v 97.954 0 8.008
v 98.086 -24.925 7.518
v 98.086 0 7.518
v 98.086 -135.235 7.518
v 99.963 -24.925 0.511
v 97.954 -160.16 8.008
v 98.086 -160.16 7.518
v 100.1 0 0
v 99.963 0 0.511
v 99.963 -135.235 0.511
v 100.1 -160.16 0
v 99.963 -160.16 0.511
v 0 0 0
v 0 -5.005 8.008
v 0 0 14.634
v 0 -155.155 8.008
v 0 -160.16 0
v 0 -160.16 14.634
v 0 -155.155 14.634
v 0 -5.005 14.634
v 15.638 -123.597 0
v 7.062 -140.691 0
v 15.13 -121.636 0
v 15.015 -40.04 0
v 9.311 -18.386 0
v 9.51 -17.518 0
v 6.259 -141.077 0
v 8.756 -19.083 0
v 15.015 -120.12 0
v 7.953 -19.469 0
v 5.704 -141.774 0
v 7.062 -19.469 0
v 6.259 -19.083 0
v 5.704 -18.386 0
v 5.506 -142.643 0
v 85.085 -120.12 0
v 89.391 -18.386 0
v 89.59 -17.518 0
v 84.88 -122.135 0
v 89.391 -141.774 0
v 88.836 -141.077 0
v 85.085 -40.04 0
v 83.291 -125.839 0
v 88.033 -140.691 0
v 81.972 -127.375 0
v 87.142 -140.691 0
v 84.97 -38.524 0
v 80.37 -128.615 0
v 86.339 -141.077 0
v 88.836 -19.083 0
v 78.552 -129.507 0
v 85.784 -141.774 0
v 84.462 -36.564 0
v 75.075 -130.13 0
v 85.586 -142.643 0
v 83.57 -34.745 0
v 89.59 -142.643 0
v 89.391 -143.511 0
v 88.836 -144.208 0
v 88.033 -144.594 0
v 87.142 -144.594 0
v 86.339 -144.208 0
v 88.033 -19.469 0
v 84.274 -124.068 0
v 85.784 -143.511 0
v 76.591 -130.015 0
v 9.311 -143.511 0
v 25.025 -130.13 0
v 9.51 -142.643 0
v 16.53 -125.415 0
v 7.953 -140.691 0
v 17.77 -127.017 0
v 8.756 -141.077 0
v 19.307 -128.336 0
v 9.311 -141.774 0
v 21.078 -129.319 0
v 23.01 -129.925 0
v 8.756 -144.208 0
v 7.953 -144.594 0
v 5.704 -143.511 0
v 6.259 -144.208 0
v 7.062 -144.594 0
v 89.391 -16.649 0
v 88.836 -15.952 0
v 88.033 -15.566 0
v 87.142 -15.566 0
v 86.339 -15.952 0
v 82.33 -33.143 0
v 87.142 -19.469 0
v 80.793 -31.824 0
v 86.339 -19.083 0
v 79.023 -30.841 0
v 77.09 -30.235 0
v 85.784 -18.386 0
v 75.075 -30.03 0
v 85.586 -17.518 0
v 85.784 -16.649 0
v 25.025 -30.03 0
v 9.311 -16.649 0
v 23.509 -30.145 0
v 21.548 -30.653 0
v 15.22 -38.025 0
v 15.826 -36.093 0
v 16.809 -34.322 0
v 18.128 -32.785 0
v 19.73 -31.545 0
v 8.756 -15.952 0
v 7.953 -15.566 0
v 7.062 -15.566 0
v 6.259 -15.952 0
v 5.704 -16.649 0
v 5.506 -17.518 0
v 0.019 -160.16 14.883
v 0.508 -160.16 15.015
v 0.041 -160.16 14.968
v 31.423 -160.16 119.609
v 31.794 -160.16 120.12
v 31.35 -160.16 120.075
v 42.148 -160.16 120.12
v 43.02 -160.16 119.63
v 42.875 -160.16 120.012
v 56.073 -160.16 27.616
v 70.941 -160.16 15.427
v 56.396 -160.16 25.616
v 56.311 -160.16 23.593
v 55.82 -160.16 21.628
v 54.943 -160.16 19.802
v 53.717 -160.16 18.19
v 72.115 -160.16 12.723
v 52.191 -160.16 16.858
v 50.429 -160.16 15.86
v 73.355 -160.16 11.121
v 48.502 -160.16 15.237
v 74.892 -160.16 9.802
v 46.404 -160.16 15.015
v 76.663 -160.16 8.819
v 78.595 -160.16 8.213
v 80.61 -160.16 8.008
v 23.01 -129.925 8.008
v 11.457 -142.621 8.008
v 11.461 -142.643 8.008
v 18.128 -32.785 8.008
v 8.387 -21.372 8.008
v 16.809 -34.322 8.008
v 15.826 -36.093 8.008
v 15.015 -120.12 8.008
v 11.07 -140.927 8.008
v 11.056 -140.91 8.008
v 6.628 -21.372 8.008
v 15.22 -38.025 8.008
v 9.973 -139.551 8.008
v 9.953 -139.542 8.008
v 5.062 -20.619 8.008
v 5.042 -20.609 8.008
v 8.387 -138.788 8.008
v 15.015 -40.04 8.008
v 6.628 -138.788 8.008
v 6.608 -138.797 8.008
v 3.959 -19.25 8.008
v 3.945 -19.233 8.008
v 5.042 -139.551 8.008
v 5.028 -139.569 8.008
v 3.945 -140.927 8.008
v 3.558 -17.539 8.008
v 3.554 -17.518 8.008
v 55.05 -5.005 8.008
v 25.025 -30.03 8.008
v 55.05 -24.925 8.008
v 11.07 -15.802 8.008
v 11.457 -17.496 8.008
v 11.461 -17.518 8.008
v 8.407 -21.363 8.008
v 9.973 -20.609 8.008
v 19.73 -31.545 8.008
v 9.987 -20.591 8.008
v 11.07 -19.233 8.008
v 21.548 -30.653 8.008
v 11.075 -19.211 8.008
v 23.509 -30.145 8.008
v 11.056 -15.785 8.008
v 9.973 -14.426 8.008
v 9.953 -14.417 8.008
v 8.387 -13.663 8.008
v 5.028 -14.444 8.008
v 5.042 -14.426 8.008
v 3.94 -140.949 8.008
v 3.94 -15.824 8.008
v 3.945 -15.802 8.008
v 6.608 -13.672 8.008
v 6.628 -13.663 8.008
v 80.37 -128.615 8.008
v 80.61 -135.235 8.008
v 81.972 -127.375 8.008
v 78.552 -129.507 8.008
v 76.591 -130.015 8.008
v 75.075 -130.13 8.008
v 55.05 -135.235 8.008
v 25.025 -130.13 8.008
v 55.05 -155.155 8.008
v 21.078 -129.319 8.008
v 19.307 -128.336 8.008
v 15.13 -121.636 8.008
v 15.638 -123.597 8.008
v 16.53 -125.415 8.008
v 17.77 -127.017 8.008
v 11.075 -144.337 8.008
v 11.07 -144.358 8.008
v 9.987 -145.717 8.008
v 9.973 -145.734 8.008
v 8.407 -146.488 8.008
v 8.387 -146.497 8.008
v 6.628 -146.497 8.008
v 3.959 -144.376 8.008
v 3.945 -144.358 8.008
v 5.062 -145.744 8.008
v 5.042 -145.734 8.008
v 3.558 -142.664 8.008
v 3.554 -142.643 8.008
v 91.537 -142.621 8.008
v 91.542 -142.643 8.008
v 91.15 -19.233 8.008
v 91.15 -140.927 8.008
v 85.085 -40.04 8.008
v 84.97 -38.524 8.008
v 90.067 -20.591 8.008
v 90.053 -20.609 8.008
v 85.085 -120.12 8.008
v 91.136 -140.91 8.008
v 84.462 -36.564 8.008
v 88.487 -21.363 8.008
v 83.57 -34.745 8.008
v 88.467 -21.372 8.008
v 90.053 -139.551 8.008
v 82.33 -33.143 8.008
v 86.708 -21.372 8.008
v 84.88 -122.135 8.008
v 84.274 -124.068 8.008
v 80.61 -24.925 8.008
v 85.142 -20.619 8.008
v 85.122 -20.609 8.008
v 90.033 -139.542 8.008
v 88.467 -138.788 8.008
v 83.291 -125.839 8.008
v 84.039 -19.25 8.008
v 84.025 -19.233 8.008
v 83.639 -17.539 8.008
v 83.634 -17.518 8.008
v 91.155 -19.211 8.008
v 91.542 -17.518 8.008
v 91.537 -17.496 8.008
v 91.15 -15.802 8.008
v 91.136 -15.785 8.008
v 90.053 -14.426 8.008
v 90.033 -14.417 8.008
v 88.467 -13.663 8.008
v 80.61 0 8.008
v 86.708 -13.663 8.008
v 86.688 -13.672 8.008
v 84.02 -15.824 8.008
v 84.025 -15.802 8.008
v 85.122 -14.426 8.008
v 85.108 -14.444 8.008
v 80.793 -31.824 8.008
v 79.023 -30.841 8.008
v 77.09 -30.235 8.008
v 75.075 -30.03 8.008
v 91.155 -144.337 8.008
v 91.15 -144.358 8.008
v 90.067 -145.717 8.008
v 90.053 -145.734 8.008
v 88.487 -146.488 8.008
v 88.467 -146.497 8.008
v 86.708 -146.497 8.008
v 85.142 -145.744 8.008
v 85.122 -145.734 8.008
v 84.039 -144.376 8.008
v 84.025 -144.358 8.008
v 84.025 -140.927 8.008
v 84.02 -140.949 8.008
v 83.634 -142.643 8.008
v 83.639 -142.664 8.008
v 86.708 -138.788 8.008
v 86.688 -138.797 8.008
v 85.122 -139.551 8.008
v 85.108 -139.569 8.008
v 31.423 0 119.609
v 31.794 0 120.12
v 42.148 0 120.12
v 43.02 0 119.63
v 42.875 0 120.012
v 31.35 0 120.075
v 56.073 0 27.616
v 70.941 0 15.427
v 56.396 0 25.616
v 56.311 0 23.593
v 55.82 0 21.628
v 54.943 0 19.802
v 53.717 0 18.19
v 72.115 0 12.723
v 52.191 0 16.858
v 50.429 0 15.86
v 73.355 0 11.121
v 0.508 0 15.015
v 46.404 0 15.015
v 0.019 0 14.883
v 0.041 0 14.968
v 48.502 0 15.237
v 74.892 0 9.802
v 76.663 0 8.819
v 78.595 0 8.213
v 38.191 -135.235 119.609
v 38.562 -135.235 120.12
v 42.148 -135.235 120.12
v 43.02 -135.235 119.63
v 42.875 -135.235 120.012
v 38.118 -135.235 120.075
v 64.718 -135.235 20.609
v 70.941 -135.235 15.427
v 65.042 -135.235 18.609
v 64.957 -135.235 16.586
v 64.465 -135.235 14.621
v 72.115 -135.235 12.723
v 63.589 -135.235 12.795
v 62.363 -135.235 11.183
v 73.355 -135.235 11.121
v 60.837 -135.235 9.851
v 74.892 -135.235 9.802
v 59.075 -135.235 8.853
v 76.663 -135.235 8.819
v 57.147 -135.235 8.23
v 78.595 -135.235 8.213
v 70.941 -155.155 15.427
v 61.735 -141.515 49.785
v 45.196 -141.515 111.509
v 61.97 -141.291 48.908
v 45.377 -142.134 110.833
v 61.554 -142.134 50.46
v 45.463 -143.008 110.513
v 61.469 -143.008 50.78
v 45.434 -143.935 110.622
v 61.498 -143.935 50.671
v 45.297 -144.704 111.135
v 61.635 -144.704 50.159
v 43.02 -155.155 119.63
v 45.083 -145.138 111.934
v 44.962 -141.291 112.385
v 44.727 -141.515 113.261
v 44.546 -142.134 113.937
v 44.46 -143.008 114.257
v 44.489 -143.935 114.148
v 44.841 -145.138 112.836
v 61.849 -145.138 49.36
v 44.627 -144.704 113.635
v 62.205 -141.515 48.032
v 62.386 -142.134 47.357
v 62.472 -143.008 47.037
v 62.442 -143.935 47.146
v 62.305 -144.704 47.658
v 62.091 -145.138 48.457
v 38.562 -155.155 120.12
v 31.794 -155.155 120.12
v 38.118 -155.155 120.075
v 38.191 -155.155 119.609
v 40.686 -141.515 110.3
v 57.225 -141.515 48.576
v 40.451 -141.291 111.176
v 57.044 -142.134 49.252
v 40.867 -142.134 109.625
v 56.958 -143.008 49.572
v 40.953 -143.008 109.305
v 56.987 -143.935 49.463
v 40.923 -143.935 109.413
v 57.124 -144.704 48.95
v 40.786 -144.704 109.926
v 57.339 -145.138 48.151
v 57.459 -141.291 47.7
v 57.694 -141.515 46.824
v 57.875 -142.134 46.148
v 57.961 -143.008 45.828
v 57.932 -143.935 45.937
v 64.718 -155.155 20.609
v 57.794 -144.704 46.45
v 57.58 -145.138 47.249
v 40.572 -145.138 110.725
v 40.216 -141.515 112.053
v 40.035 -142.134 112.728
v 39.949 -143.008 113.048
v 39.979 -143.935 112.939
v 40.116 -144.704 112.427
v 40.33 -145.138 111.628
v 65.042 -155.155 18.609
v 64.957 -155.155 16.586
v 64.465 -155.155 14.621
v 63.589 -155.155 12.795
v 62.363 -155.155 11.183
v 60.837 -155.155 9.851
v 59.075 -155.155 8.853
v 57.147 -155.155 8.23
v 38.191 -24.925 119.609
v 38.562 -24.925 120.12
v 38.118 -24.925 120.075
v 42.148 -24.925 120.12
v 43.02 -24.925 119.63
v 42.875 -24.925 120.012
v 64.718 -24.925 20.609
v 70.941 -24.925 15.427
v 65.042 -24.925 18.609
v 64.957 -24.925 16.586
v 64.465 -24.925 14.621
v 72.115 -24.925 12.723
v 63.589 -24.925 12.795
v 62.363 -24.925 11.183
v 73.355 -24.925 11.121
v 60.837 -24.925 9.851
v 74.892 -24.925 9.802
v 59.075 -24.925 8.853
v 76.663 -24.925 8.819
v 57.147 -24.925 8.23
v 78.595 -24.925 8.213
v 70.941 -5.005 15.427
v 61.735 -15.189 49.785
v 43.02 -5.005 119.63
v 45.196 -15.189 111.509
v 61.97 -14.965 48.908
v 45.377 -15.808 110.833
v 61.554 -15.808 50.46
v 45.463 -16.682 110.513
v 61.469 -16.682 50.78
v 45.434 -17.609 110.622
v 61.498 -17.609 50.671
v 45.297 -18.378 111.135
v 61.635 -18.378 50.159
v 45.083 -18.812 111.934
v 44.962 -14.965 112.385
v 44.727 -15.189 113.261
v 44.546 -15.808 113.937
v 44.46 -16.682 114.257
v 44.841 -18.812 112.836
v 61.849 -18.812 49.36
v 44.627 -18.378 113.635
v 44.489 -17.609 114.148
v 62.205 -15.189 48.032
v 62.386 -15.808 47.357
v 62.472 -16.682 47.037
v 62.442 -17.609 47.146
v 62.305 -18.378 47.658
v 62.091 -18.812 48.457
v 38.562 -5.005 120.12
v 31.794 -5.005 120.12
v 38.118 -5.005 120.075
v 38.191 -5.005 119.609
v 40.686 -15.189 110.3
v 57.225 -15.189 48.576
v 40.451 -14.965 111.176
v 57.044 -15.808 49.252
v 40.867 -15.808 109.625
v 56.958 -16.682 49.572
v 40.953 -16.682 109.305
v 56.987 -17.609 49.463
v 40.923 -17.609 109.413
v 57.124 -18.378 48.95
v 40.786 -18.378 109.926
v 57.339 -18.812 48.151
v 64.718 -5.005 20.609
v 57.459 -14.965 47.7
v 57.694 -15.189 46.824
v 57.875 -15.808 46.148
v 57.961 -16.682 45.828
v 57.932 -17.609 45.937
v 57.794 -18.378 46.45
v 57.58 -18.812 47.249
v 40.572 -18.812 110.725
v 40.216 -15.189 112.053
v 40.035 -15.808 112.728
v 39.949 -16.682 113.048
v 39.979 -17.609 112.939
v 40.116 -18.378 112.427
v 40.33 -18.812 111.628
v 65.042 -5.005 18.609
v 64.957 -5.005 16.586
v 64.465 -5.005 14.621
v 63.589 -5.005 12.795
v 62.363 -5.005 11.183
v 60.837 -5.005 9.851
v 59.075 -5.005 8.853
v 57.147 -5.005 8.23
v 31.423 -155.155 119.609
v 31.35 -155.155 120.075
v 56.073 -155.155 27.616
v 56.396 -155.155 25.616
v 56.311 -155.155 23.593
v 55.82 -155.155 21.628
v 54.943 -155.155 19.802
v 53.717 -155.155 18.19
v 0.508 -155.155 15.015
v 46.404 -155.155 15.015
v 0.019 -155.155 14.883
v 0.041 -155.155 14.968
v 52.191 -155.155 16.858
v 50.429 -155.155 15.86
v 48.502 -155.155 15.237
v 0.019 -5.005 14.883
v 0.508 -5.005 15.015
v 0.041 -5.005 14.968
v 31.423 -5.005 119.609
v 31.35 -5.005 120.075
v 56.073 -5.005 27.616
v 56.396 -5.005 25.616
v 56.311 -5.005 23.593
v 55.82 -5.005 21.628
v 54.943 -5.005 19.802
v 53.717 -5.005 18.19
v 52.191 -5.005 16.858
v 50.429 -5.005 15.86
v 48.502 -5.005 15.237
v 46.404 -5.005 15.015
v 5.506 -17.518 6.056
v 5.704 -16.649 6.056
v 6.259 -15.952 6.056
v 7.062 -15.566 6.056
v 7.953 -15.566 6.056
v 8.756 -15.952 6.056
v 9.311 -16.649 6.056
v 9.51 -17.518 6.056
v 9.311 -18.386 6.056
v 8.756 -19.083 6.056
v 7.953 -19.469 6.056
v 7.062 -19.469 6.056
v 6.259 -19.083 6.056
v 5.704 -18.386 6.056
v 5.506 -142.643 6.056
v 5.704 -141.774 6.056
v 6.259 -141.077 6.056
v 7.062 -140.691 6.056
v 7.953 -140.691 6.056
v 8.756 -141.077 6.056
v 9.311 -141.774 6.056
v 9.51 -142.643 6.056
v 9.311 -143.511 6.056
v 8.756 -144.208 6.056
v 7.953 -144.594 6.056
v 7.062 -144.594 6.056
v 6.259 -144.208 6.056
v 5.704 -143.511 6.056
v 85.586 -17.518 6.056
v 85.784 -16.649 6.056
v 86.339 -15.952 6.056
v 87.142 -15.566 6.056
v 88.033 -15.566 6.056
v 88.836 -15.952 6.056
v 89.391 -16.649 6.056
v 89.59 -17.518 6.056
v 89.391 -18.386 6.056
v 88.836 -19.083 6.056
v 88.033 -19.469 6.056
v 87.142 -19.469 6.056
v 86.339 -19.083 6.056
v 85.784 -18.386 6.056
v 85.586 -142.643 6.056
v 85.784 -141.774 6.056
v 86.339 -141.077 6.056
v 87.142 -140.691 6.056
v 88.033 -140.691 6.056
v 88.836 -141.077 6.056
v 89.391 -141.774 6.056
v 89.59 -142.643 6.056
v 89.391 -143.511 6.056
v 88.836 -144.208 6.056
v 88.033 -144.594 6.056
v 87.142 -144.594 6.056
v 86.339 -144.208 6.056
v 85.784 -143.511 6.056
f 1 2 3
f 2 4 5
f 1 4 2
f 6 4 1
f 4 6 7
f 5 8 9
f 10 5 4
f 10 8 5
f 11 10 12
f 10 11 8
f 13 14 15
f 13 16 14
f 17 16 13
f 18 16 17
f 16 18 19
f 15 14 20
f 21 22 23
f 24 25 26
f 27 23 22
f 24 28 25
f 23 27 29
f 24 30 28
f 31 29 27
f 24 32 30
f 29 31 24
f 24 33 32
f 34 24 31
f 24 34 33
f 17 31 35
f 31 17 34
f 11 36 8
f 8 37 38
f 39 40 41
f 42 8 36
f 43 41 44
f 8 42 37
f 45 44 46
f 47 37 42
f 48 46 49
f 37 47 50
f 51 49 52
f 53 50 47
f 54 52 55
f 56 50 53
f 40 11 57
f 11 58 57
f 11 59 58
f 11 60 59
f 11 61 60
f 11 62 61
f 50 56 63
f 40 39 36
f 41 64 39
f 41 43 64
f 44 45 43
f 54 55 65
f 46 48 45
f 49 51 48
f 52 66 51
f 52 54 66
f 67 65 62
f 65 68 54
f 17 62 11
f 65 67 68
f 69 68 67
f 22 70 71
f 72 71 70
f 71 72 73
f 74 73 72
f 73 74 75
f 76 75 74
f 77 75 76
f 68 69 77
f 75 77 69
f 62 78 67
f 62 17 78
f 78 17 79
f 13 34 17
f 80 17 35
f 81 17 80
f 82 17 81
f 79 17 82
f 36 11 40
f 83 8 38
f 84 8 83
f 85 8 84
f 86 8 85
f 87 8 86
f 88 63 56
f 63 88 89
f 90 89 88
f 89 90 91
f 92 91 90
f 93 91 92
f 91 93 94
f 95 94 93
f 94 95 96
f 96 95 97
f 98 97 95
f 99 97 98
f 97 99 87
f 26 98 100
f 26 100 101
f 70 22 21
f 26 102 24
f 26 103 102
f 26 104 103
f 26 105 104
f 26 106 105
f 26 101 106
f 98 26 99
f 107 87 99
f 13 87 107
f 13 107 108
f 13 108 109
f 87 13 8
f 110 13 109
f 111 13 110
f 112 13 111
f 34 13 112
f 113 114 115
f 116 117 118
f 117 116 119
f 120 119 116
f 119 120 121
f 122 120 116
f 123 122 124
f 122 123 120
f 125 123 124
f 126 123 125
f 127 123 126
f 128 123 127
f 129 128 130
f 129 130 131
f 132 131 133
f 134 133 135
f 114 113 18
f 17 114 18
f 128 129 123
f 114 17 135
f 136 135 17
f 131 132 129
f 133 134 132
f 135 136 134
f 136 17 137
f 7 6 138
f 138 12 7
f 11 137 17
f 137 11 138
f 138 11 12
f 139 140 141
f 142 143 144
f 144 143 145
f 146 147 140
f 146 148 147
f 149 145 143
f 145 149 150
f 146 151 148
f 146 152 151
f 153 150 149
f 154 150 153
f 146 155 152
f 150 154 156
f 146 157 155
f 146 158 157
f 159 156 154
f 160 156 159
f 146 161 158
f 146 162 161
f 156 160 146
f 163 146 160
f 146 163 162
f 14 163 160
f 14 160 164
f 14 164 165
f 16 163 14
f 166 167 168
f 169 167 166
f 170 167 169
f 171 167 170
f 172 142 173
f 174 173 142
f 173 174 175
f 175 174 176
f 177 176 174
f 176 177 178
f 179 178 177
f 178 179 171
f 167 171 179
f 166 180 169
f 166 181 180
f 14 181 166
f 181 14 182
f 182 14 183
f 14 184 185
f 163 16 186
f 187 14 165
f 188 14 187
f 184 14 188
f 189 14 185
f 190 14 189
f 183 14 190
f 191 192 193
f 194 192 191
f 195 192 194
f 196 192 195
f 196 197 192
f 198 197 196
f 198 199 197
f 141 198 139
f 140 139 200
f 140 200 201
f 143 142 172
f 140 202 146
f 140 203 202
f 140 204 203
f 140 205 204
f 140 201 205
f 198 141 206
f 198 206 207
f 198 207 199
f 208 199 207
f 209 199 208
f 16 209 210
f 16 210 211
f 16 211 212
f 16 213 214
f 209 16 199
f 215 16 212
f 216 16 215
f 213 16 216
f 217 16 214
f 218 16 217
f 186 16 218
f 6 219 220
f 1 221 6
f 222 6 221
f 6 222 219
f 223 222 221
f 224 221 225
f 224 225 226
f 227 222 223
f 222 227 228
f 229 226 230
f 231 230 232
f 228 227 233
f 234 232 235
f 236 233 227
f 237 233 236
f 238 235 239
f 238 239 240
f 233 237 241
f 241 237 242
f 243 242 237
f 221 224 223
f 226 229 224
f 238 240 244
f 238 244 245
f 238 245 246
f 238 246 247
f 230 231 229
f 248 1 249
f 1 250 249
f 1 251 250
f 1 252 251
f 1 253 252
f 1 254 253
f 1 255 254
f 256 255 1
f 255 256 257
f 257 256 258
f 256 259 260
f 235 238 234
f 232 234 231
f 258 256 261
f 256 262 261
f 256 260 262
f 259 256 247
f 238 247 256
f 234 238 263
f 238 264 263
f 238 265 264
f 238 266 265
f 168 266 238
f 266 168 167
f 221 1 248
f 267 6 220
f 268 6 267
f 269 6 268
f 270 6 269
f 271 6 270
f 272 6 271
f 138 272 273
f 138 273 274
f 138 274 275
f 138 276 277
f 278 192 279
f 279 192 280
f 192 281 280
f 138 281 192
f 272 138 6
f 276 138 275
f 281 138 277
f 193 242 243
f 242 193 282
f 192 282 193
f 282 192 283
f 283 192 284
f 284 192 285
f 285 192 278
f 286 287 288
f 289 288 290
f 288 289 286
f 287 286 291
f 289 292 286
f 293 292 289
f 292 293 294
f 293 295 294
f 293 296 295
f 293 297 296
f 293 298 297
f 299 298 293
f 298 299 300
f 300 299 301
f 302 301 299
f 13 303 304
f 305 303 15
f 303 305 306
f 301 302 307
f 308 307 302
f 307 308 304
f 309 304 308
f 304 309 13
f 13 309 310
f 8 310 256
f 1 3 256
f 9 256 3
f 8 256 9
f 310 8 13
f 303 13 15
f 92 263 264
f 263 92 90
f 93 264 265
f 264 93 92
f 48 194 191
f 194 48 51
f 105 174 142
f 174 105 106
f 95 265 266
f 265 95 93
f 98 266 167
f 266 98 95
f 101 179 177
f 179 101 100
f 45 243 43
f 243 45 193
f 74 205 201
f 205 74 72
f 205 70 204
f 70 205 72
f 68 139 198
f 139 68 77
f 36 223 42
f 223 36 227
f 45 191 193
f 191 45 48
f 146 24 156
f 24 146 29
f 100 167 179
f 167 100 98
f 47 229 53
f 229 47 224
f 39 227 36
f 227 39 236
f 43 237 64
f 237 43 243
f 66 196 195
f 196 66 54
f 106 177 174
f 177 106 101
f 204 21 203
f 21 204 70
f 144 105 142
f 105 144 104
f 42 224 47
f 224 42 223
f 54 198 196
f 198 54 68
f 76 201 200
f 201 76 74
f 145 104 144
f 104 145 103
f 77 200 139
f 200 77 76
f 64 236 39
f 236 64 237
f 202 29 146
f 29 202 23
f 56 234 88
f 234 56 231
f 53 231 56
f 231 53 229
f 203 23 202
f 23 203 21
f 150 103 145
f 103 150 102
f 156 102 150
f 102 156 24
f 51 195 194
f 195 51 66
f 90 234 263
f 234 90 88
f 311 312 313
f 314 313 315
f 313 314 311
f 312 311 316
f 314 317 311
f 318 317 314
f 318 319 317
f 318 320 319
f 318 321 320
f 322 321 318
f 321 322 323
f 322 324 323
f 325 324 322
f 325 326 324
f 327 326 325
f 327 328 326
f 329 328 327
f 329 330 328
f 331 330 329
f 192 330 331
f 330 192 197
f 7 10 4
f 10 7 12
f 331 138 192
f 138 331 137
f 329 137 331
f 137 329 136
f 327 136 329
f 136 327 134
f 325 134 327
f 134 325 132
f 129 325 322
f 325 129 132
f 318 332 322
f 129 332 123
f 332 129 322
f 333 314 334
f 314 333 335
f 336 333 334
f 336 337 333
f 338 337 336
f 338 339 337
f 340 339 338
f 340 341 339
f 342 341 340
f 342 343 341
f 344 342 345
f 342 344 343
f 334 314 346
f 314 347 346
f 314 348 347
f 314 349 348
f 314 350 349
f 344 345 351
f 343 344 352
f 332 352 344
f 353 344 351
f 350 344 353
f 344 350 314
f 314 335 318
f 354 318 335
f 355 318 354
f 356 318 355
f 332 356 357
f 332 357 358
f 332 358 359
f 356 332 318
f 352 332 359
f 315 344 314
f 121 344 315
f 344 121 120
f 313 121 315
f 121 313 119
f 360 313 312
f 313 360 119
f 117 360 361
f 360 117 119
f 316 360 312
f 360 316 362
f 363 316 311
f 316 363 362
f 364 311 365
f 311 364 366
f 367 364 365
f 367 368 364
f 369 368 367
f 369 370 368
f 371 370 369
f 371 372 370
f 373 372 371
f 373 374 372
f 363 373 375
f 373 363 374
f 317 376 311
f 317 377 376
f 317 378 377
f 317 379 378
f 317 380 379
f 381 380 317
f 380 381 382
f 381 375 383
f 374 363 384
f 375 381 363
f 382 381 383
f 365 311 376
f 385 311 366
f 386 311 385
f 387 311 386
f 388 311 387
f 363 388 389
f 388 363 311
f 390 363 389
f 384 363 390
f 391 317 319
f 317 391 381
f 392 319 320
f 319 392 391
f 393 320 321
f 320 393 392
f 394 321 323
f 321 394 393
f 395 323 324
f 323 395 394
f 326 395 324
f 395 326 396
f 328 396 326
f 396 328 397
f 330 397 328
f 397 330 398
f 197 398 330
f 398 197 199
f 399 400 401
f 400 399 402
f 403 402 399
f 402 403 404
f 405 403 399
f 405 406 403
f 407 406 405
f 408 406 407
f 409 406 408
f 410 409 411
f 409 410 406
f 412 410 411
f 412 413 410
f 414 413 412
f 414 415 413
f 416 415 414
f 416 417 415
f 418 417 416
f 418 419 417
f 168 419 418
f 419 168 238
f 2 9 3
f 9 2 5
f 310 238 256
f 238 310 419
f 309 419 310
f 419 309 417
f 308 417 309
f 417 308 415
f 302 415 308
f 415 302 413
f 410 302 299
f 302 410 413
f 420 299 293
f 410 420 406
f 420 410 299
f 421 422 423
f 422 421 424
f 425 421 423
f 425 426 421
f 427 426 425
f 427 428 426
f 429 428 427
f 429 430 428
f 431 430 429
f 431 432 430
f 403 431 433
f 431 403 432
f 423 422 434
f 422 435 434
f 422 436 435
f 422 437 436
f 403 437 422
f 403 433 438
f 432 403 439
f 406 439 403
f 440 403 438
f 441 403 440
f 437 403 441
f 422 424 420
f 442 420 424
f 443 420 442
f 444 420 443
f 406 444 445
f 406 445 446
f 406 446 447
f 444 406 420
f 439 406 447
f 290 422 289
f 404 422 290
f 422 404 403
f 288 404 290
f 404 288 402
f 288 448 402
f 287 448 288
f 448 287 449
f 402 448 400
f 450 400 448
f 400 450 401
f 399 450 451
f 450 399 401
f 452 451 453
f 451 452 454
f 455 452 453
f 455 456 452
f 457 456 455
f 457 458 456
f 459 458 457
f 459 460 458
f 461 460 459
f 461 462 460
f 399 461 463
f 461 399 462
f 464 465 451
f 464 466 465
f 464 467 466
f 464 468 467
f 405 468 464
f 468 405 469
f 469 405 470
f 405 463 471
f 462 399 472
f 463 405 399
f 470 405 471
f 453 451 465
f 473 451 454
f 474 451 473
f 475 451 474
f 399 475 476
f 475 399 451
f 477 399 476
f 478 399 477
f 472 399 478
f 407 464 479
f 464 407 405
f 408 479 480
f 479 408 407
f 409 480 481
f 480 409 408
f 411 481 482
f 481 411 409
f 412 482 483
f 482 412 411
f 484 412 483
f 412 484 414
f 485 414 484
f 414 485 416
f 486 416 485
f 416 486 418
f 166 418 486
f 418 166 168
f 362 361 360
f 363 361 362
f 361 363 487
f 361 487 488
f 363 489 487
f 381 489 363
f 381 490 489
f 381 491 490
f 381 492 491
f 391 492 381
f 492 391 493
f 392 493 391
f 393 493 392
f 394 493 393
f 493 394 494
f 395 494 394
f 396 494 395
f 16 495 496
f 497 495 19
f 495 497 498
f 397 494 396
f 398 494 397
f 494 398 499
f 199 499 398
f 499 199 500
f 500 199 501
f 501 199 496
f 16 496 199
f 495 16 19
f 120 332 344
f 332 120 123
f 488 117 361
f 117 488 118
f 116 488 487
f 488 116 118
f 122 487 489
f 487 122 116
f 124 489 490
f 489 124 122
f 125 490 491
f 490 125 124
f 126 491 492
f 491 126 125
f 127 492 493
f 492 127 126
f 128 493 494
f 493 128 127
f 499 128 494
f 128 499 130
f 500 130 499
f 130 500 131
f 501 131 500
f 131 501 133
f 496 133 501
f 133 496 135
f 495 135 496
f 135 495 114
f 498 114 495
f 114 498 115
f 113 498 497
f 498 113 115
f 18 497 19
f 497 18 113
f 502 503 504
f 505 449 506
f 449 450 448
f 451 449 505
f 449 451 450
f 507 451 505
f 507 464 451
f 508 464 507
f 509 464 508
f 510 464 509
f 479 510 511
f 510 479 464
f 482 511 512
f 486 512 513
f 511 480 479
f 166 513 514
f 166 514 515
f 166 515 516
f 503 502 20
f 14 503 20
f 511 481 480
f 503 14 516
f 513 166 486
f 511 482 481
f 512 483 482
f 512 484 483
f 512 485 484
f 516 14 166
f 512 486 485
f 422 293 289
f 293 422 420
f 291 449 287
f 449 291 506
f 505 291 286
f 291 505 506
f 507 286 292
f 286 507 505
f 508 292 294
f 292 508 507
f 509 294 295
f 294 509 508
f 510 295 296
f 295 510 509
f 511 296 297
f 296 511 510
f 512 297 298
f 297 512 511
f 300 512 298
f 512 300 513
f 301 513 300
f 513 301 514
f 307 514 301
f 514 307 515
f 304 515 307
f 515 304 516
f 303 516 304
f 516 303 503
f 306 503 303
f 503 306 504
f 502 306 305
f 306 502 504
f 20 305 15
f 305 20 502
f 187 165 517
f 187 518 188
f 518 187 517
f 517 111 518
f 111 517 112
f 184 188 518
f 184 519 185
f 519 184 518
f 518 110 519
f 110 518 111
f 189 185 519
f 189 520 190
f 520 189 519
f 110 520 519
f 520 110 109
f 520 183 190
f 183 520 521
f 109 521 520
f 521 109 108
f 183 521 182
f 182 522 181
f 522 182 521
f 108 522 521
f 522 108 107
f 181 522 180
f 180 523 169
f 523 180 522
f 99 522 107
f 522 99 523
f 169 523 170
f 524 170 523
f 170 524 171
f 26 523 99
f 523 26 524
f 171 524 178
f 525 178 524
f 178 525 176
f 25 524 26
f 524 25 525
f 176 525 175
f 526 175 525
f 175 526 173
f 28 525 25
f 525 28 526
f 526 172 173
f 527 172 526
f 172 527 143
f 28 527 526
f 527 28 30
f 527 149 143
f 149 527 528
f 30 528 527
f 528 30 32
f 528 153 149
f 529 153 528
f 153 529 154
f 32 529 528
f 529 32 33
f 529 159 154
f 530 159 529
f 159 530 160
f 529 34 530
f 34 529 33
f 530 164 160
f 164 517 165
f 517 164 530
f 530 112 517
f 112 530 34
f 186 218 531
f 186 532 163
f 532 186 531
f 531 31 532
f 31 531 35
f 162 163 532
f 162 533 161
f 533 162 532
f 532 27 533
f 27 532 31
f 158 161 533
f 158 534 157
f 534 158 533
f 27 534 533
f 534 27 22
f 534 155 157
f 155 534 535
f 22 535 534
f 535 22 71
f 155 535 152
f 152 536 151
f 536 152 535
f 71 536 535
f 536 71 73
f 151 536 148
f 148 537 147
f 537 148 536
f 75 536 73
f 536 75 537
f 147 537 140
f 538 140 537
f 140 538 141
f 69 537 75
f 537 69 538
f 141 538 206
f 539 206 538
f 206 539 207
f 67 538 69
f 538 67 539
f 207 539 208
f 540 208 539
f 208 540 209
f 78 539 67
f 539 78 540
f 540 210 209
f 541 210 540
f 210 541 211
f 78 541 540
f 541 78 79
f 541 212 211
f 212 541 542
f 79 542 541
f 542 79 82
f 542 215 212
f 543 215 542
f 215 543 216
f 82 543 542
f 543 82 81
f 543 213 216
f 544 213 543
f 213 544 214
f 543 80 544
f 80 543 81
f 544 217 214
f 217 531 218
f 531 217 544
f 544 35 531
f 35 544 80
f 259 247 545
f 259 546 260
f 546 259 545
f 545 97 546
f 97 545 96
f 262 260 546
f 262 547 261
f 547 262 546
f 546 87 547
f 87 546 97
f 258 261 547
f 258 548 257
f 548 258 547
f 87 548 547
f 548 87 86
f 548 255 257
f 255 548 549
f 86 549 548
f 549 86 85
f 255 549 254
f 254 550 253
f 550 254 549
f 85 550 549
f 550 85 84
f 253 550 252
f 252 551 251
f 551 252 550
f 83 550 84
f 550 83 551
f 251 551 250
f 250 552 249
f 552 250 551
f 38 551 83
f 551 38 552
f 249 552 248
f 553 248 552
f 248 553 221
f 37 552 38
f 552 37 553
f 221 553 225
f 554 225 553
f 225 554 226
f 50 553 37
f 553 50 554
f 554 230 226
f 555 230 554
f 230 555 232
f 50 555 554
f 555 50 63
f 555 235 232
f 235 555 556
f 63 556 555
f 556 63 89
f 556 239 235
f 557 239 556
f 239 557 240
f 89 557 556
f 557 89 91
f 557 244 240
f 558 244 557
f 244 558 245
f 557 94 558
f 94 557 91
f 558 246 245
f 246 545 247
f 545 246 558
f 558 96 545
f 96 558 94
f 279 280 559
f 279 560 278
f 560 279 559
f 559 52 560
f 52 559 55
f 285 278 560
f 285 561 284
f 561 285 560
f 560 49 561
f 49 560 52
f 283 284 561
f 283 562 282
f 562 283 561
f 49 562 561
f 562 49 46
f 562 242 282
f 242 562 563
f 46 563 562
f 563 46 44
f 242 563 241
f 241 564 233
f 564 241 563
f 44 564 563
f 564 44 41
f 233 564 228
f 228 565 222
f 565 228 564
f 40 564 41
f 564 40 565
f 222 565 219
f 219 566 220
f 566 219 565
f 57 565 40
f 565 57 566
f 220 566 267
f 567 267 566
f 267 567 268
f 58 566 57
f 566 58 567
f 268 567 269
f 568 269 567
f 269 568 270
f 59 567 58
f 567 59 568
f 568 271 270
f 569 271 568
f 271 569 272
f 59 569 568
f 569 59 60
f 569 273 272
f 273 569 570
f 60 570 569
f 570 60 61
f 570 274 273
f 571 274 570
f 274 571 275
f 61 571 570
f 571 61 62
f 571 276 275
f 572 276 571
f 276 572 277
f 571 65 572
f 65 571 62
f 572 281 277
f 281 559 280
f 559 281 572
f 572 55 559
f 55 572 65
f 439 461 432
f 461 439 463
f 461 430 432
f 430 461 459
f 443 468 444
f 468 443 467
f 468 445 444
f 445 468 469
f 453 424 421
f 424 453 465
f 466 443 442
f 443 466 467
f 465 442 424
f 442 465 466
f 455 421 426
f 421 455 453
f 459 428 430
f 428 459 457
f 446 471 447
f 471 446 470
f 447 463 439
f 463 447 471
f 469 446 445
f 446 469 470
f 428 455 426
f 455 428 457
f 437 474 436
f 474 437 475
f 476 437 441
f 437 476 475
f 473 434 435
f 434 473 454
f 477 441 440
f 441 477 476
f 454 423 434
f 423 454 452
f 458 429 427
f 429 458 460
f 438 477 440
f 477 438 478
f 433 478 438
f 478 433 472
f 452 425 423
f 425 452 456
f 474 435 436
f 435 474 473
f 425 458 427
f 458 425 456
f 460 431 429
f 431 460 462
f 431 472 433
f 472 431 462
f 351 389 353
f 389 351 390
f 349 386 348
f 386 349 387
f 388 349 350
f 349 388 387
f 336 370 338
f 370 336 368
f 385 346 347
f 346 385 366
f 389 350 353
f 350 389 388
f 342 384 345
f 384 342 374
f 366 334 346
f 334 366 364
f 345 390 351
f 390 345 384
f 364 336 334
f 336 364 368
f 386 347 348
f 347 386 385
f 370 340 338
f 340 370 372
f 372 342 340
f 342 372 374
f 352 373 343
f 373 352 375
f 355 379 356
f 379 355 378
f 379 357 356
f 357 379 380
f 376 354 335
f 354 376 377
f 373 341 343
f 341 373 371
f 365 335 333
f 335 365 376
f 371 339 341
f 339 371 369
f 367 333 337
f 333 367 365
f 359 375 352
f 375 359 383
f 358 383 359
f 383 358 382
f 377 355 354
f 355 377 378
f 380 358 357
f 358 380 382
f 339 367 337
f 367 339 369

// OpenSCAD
//------------------------------------------------------------------
/*

Simple Display Stand for Rasberry Pi 7" Display

Similar to: http://www.thingiverse.com/thing:1021025

But:

1) OpenSCAD.
2) Allow the usb power port to be at the bottom (normal display orientation).
3) Provide mounting holes on the foot.
4) Variable thickness display supports to accomodate various M3 screw lengths.
5) Added webbing for better strength.
6) Adjustable foot size for better free-standing stability.

*/
//------------------------------------------------------------------
/* [Global] */

/*[General]*/
display_angle = 15;

/*[Base]*/
base_height = 8;
base_length = 160;
base_width = 100;
base_mount_hole_diameter = 4;
base_hole_rounding = 10;
base_mount_hole_posn = 0.8; // [0:0.05:1]
foot_sizex = 15;
foot_sizey = 30;

/*[Supports]*/
support_posn = 0.75; // [0:0.05:1]
support_height = 120;
support_thickness = 5;
support_hole2edge = 8;

/*[Webs]*/
web_thickness = 7;
web_radius = 10;

/* [Hidden] */
//------------------------------------------------------------------
// utility functions

// scaling
pla_shrink = 1/0.999; //~0.1%
abs_shrink = 1/0.995; //~0.5%
function scale(x) = pla_shrink * x;

// small tweak to avoid differencing artifacts
epsilon = 0.05;

// control the number of facets on cylinders
facet_epsilon = 0.05;
function facets(r) = 180 / acos(1 - (facet_epsilon / r));

// rounded/filleted edges
module inverse() {
  difference() {
    square(1e5, center=true);
    children(0);
  }
}
module rounded(r=1) {
  offset(r=r, $fn=facets(r)) offset(r=-r, $fn=facets(r)) children(0);
}
module filleted(r=1) {
  offset(r=-r, $fn=facets(r)) render() offset(r=r, $fn=facets(r)) children(0);
}

//------------------------------------------------------------------

// 4 x M3 mounting holes on display
mount_hole_w = scale(126.20);
mount_hole_h = scale(65.65);
display_mhr = scale(3.9/2);

// derived values
base_h = scale(base_height);
base_w = scale(base_width);
base_l = scale(base_length);
base_hr = scale(base_hole_rounding);
base_mhr = scale(base_mount_hole_diameter/2);

foot_sx = scale(foot_sizex);

support_h = scale(support_height);
support_t = scale(support_thickness);
support_h2e = scale(support_hole2edge);

web_t = scale(web_thickness);
web_r = scale(web_radius);

support_face_w = support_h2e + ((base_l - mount_hole_w) / 2);
foot_sy = max(support_face_w, scale(foot_sizey));

//------------------------------------------------------------------
// general screw hole: length, radius, style

module hole(l, r, style) {
  if (style == "countersunk") {
    if (r > l) {
      points = [
        [0, 0],
        [(2 * r) - l, 0],
        [2 * r, l],
        [0, l]
      ];
      rotate_extrude($fn=facets(r)) polygon(points=points);
    } else {
      points = [
        [0, 0],
        [r, 0],
        [r, l - r],
        [2 * r, l],
        [0, l]
      ];
      rotate_extrude($fn=facets(r)) polygon(points=points);
    }
  } else {
    // plain hole
    cylinder(h=l, r=r, $fn=facets(r));
  }
}

//------------------------------------------------------------------

module base_2d(h, w) {
  delta = h * tan(display_angle);
  points = [
    [0, 0],
    [0, h],
    [w - delta, h],
    [w, 0],
  ];
  polygon(points=points);
}

module support_2d(t) {
  d0 = support_h * tan(display_angle);
  d1 = t * cos(display_angle);
  x0 = base_w * support_posn;
  points = [
    [x0, 0],
    [x0 - d1, 0],
    [x0 - d1 - d0, support_h],
    [x0 - d0, support_h],
  ];
  polygon(points=points);
}

//------------------------------------------------------------------
// web

module web_profile() {
  filleted(r=web_r) union() {
    support_2d(support_t + web_t);
    base_2d(base_h + web_t, base_w * support_posn);
  }
}

module web_right() {
  linear_extrude(height=support_t) web_profile();
}

module web_left() {
  translate([0,0,base_l - support_t]) web_right();
}

module web() {
  web_left();
  web_right();
}

//------------------------------------------------------------------
// base

module base_body_profile() {
  base_2d(base_h, base_w);
}

module base_hole_profile() {
  sx = base_w - (2 * foot_sx);
  sy = base_l - (2 * foot_sy);
  rounded(r=base_hr) square(size=[sx, sy]);
}

module base() {
  h = base_h + (2 * epsilon);
  difference() {
    linear_extrude(height=base_l) base_body_profile();
    translate([foot_sx,base_h + epsilon,foot_sy]) rotate([90,0,0]) linear_extrude(height=h) base_hole_profile();
  }
}

module base_mount_hole() {
  l = base_h + (2 * epsilon);
  translate([0,-epsilon,0]) rotate([-90,0,0]) hole(l=l, r=base_mhr, style="countersunk");
}

module base_mount_holes() {
  z0 = (foot_sy + support_t) / 2;
  z1 = base_l - z0;
  x0 = foot_sx / 2;
  x1 = x0 + (base_mount_hole_posn * base_w);
  union() {
    translate([x0,0,z0]) base_mount_hole();
    translate([x0,0,z1]) base_mount_hole();
    translate([x1,0,z0]) base_mount_hole();
    translate([x1,0,z1]) base_mount_hole();
  }
}

//------------------------------------------------------------------
// supports

module support_profile() {
  filleted(r=web_r) union() {
    base_2d(base_h, base_w);
    support_2d(support_t);
  }
}

module support_right() {
  linear_extrude(height=support_face_w) support_profile();
}

module support_left() {
  translate([0,0,base_l - support_face_w]) support_right();
}

module support() {
  support_left();
  support_right();
}

module display_mount_hole() {
  l = support_t + (2 * epsilon);
  rotate([0,90,0]) hole(l=l, r=display_mhr, style = "plain");
}

module display_mount_holes() {
  dx0 = base_w * support_posn;
  dx = support_t + epsilon;
  dy = (support_h / cos(display_angle)) - mount_hole_h - support_h2e;
  dz = (base_l - mount_hole_w) / 2;
  translate([dx0, 0,0]) rotate([0,0,display_angle]) translate([-dx,dy,dz]) union() {
    dx = mount_hole_w;
    dy = mount_hole_h;
    translate([0,0,0]) display_mount_hole();
    translate([0,dy,0]) display_mount_hole();
    translate([0,dy,dx]) display_mount_hole();
    translate([0,0,dx]) display_mount_hole();
  }
}

//------------------------------------------------------------------

module display_stand() {
  difference() {
    union() {
      base();
      support();
      web();
    }
    union() {
      base_mount_holes();
      display_mount_holes();
    }
  }
}

rotate([90,0,0]) display_stand();

//------------------------------------------------------------------
